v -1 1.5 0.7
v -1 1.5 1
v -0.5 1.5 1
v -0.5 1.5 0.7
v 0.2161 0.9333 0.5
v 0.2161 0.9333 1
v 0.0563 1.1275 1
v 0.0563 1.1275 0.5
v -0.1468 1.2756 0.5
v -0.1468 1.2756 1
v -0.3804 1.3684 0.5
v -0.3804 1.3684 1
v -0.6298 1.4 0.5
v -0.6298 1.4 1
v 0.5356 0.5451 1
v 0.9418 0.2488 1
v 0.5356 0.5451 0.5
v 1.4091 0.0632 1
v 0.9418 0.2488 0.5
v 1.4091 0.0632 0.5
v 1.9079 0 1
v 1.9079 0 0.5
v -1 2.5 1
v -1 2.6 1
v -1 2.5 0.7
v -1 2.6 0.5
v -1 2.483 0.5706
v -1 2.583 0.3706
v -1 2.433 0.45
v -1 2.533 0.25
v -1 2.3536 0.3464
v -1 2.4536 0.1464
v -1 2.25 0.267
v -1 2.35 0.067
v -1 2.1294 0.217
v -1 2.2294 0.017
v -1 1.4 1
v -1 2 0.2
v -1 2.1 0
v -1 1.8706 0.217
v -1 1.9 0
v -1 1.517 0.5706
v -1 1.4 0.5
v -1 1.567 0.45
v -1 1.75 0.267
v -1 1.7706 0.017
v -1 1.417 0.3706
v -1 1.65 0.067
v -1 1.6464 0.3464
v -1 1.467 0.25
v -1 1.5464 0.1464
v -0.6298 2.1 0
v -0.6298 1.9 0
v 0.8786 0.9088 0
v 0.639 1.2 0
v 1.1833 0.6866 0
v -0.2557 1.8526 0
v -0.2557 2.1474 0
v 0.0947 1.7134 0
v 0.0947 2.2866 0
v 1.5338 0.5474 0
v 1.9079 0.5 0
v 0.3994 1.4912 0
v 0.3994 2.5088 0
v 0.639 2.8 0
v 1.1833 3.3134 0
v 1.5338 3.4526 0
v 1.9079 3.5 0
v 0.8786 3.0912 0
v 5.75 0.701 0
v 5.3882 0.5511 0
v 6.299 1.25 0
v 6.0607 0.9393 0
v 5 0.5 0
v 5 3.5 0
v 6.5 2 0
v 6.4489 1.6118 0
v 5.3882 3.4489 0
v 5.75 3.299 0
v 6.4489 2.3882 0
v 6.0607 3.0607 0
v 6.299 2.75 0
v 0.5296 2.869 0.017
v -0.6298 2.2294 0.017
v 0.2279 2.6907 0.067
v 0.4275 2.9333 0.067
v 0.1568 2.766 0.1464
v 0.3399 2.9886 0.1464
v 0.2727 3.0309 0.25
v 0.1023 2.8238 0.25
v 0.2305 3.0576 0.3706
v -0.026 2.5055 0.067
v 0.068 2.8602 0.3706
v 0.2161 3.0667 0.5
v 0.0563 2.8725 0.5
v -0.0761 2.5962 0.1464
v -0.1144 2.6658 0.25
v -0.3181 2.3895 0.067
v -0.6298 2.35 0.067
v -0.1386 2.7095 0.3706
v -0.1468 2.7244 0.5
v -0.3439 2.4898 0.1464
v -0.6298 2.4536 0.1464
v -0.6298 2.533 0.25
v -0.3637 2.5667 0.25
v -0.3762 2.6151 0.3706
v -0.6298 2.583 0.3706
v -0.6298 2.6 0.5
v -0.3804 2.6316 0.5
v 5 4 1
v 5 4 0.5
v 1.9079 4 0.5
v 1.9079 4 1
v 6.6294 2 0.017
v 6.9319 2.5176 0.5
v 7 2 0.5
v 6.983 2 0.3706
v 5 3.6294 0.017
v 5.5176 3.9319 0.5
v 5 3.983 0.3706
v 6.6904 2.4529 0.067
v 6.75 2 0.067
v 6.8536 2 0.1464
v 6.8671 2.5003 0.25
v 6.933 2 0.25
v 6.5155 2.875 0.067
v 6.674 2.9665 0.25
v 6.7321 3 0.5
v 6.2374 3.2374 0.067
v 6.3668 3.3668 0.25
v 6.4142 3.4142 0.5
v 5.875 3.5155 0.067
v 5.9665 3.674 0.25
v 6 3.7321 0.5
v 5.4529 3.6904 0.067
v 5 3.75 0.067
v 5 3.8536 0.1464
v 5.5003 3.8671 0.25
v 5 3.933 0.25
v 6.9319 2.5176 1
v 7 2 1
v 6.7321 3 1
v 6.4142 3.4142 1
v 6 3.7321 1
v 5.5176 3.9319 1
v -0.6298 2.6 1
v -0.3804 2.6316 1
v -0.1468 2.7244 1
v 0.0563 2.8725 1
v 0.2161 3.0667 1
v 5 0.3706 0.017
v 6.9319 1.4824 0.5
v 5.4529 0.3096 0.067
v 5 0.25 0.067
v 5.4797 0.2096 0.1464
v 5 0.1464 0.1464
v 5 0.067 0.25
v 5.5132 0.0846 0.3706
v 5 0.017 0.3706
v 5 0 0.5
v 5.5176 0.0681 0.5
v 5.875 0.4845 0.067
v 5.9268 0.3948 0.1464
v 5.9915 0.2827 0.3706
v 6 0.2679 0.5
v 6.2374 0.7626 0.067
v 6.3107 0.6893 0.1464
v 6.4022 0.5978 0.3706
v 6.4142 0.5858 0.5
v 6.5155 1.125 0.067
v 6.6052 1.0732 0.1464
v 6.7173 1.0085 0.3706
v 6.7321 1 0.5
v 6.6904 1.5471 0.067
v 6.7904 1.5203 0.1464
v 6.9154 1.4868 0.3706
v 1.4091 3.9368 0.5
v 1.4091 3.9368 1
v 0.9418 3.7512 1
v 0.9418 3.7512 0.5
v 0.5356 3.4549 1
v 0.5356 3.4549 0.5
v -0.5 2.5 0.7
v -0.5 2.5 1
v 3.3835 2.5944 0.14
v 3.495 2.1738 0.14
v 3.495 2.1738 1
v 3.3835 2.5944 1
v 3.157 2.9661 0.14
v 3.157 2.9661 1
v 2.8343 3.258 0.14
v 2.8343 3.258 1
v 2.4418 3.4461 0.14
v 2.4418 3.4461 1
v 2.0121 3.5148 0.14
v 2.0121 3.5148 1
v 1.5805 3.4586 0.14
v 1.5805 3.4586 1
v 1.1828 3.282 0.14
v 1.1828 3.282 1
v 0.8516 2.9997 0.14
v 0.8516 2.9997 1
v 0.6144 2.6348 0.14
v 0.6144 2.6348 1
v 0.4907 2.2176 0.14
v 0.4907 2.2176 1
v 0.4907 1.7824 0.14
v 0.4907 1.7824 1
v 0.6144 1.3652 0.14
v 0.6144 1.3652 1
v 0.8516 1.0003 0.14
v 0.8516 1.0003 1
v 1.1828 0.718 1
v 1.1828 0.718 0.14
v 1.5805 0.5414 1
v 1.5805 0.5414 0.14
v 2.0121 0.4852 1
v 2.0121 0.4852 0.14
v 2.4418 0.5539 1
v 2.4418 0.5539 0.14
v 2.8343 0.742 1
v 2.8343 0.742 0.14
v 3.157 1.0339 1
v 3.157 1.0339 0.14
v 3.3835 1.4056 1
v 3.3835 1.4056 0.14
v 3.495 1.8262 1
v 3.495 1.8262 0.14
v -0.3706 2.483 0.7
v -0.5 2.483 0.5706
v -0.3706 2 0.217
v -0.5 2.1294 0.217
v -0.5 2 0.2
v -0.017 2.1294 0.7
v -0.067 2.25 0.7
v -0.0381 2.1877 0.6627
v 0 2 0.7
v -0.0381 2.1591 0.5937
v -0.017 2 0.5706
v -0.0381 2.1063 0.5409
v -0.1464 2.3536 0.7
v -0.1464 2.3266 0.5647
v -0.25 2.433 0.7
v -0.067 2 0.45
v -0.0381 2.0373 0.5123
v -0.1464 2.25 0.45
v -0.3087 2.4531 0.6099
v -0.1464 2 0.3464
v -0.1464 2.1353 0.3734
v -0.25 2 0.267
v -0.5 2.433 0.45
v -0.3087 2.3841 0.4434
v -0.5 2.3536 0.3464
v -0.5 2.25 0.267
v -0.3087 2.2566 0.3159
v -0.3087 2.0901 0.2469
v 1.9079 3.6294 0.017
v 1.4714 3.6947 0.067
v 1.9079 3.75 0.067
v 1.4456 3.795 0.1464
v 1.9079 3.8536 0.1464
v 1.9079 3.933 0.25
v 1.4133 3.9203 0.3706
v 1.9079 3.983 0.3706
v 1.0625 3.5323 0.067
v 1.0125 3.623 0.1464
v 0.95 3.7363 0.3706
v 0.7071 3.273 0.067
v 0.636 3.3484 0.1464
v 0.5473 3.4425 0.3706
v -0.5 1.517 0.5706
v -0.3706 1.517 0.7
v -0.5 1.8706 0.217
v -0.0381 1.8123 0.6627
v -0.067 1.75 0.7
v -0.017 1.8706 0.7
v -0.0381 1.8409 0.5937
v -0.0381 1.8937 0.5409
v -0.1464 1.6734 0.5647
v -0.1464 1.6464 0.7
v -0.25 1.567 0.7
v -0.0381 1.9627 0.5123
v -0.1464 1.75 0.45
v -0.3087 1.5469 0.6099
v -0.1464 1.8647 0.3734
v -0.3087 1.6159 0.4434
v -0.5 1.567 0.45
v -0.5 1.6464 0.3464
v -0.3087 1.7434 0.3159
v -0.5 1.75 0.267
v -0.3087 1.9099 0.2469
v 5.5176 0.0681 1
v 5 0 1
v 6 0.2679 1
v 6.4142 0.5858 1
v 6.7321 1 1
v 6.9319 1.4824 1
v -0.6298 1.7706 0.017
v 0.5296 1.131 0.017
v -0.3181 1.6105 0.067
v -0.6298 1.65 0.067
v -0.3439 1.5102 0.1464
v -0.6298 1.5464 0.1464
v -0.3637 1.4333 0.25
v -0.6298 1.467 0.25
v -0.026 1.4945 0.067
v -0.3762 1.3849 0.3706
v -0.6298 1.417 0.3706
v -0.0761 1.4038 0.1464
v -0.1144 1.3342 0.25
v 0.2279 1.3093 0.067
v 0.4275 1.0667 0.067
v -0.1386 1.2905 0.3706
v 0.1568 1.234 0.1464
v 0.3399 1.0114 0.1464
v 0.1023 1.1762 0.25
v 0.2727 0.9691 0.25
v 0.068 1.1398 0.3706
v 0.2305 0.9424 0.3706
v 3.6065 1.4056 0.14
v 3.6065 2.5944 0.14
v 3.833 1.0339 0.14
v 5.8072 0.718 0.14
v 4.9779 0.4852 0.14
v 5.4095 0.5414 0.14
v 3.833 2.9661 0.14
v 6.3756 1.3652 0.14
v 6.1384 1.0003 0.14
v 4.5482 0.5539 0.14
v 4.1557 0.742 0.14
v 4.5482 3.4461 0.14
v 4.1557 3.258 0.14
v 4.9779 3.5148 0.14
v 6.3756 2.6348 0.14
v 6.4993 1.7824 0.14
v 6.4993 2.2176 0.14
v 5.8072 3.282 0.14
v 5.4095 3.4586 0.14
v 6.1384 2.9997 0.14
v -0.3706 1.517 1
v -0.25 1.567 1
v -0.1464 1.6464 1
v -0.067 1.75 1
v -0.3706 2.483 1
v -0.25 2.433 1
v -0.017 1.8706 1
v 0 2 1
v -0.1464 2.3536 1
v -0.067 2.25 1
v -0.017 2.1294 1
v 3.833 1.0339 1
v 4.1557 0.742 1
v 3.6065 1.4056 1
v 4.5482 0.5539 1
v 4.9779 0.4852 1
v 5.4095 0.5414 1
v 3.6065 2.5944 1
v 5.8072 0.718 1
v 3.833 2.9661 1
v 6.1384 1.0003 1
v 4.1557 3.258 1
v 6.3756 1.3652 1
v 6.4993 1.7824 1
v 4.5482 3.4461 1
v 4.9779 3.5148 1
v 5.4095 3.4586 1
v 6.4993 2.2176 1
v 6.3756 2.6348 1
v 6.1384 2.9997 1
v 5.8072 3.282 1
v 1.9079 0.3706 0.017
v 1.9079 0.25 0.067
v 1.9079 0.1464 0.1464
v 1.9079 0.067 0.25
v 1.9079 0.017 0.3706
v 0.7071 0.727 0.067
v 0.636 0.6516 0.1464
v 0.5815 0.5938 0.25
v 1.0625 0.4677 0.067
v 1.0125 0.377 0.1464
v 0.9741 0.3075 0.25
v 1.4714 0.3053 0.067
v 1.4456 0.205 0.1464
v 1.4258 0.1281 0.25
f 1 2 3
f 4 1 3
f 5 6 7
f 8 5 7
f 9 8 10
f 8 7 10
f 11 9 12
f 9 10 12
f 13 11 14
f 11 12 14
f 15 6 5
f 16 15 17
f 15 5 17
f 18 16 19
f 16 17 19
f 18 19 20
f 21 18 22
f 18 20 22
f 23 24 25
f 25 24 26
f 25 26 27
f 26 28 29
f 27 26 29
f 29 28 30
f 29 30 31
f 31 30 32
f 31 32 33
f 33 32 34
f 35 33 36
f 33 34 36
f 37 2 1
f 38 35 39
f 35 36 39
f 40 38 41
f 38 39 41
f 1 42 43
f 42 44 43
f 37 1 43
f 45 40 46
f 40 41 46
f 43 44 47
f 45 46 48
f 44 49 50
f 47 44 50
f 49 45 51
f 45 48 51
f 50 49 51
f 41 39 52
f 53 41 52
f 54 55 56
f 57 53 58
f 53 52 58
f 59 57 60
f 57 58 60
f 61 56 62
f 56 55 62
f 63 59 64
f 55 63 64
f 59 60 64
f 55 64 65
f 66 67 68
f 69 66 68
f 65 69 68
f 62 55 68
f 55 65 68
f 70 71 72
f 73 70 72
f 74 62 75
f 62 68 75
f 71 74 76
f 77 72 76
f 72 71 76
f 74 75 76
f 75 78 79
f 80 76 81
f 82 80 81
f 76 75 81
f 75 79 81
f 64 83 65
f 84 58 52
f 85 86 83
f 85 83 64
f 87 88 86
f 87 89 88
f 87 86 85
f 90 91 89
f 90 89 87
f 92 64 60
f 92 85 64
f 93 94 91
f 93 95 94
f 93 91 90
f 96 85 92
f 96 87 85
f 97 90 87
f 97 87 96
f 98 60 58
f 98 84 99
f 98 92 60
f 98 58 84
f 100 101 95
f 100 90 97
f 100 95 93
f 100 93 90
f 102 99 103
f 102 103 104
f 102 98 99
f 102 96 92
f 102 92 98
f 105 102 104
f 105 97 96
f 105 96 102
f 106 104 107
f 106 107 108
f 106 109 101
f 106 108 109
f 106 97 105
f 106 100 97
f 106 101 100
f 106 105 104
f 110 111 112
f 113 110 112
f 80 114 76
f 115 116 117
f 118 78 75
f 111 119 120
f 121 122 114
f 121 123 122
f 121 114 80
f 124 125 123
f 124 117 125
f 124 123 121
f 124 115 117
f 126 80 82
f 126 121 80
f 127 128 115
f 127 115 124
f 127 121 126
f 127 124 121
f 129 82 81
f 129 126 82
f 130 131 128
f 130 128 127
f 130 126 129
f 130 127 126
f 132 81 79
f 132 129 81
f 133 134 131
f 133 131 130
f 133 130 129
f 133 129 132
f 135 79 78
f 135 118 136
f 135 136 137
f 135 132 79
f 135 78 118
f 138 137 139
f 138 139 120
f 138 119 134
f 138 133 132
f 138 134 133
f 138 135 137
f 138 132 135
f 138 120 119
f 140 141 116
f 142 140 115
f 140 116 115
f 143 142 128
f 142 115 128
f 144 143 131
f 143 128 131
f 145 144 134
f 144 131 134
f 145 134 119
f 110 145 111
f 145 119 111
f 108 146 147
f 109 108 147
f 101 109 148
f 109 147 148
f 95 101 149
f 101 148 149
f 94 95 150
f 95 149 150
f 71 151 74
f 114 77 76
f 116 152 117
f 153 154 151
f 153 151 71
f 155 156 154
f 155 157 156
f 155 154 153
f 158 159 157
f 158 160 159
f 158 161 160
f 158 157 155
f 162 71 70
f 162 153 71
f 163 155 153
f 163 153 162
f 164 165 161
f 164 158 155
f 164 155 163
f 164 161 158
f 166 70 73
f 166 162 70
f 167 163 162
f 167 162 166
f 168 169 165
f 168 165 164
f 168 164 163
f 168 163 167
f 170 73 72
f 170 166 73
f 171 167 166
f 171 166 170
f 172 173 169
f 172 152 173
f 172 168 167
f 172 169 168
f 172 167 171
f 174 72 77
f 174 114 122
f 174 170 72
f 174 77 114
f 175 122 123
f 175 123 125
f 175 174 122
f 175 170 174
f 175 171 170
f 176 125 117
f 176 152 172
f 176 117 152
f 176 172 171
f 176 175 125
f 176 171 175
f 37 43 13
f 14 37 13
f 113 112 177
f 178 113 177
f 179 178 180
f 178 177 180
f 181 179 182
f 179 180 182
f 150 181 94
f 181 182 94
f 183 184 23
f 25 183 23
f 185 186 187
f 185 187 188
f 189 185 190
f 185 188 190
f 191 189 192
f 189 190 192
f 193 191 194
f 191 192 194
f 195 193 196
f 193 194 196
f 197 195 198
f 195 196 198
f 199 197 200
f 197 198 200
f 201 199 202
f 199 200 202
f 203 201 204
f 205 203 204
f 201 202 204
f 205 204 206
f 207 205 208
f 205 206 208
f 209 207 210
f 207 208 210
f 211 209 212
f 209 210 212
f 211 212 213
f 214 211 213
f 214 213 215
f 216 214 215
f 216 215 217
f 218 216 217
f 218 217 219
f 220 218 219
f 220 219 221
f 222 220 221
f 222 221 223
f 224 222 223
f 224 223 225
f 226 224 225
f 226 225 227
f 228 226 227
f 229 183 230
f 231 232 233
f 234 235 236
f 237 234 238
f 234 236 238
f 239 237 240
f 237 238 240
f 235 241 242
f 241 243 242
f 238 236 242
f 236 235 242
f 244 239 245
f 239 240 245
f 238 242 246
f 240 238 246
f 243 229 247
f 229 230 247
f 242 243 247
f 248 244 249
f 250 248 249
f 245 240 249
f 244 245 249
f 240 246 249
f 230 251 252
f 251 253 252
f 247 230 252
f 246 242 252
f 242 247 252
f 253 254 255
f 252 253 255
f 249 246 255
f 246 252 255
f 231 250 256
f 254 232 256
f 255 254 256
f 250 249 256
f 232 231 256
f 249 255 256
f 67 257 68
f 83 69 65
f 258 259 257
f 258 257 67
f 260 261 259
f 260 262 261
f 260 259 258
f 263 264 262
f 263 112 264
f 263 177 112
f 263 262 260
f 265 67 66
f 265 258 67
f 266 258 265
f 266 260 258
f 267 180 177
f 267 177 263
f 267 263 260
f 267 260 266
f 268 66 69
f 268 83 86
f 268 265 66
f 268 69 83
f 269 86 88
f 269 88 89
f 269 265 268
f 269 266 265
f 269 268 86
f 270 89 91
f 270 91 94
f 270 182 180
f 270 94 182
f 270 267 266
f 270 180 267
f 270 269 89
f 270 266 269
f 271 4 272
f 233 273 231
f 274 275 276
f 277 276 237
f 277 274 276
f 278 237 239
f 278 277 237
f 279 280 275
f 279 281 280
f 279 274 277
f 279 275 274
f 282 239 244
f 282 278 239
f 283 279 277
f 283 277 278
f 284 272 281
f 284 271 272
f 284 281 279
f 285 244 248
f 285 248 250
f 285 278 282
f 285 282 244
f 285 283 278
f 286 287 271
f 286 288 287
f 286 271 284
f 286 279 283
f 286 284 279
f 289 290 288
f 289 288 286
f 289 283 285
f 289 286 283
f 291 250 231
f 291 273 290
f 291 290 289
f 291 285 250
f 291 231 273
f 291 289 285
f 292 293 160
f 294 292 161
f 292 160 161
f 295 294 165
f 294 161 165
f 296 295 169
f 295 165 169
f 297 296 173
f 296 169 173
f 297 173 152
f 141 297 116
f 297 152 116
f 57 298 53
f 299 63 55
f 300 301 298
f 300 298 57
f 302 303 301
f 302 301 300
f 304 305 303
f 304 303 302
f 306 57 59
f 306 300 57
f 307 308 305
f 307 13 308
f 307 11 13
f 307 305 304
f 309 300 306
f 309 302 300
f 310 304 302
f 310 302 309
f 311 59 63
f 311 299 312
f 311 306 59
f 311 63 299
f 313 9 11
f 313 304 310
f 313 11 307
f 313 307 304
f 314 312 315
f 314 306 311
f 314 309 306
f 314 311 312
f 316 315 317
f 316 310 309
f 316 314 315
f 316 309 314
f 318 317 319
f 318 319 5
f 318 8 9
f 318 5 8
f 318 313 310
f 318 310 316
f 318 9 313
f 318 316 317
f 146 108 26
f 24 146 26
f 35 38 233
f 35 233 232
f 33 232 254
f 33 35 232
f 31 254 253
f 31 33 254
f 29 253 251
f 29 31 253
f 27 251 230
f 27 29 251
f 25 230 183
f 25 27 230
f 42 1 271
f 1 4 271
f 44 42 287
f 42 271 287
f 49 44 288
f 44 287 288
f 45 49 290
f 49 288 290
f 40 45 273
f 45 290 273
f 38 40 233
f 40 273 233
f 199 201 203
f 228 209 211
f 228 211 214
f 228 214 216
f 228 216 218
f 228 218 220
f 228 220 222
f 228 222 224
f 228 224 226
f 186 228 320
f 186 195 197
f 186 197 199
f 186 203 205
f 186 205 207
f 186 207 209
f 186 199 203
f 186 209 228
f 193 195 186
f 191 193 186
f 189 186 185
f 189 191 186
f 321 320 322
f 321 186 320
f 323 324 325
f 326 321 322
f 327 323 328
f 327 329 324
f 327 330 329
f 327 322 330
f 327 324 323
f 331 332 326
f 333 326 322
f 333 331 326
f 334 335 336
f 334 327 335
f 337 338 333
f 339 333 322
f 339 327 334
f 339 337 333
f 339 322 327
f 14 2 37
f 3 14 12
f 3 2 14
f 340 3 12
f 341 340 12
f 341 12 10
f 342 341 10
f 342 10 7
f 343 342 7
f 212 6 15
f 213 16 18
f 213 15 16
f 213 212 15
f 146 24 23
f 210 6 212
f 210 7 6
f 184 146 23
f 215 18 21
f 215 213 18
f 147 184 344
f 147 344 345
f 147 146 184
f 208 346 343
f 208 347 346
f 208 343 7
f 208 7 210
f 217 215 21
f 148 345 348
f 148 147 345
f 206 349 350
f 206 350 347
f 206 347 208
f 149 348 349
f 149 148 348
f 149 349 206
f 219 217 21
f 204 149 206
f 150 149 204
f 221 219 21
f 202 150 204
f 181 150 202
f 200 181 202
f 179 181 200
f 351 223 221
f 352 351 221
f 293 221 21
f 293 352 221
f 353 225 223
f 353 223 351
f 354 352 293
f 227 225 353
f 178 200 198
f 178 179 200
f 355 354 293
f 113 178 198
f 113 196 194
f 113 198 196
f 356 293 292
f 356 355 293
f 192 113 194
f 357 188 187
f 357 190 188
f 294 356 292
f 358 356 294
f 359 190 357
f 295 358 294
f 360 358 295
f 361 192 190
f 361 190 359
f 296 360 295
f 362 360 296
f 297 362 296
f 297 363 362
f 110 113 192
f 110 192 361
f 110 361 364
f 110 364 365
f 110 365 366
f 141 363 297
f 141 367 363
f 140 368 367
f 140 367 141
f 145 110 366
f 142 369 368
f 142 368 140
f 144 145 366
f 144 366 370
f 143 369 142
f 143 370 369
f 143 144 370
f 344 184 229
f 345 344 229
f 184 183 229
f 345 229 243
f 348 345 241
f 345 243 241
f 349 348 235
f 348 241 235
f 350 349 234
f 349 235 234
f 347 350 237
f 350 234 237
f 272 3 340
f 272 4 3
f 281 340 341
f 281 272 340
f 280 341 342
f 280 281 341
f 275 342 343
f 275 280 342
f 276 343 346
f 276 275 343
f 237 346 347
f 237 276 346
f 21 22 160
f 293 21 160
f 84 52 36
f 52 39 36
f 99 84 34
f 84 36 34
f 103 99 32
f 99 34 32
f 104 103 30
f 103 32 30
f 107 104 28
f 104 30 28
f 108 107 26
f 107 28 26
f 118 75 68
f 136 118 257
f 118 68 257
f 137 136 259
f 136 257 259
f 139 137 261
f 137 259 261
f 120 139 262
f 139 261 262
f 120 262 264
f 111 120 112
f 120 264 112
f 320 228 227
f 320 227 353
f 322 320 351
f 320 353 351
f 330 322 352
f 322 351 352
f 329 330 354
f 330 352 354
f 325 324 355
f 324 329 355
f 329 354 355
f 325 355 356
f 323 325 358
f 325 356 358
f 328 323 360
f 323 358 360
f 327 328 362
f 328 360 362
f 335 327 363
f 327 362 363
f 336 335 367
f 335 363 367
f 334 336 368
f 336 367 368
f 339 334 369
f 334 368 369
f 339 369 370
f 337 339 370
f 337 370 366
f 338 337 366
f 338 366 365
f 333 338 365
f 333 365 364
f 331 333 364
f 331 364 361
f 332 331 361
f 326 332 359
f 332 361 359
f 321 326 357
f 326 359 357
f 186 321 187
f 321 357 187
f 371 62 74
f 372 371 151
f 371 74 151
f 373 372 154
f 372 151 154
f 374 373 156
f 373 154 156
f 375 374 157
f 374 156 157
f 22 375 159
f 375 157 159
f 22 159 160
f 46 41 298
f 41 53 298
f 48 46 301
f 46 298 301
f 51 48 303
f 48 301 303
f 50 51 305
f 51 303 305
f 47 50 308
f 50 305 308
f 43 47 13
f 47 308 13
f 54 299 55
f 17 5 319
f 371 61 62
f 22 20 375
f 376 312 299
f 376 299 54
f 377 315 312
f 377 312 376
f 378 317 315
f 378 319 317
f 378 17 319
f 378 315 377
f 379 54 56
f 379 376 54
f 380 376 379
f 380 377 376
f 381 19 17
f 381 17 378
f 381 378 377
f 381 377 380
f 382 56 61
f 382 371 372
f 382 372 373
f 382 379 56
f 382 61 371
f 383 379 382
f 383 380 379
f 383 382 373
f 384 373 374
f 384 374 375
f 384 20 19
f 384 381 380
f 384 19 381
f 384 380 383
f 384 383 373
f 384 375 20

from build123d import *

# Parameters (mm, degrees)
F1_DEPTH    = 1
F2_R        = 1.515
F3_DEPTH    = 0.86
F4_R        = 1.515
F5_DEPTH    = 0.86
F6_DEPTH    = 0.6
F8_DEPTH    = 0.8
F9_T1_DEPTH = 10.5393920142
F9_T3_DEPTH = 11
F10_R       = 1
F11_R       = 0.49999
F12_R       = 0.5


# Not quite as in the source:
# - a fillet or chamfer that OpenCascade refuses, or shapes differently, is made with other operations: its cross-section is extruded or revolved along the edge and cut away or added
# - a fillet or chamfer is up to 0.001 mm smaller than in the source, because OpenCascade refuses the exact size


with BuildPart() as f1:
    # F0 (on Top) → F1 (new body)
    with BuildSketch(Plane.XY):
        Polygon((0, 1.4), (0, 0), (7, 0), (7, 4), (0, 4), (0, 2.6), (0, 2), align=None)
        Polygon((-1, 1.4), (0, 1.4), (0, 2), (0, 2.6), (-1, 2.6), align=None)
    extrude(amount=F1_DEPTH)

    # F2 (on face) → F3 (cut)
    with BuildSketch(Plane.XY.offset(1)):
        with Locations((5, 2)):
            Circle(F2_R)
    extrude(amount=-F3_DEPTH, mode=Mode.SUBTRACT)

    # F4 (on face) → F5 (cut)
    with BuildSketch(Plane.XY.offset(1)):
        with Locations((1.99, 2)):
            Circle(F4_R)
    extrude(amount=-F5_DEPTH, mode=Mode.SUBTRACT)

    # F4 (on face) → F6 (cut)
    with BuildSketch(Plane.XY.offset(1)):
        with Locations((1.99, 2)):
            Circle(F4_R)
    extrude(amount=-F6_DEPTH, mode=Mode.SUBTRACT)

    # F7 (on face) → F8 (cut)
    with BuildSketch(Plane.XY.offset(1)):
        Polygon((-1, 2.5), (-1, 2), (-1, 1.5), (0, 1.5), (0, 2.5), align=None)
    extrude(amount=-F8_DEPTH, mode=Mode.SUBTRACT)

    # F9: fillet of radius 2 on 4 edges, made by hand

    # F9_s2 → F9_t1 (cut)
    with BuildSketch(Plane.XY.offset(-4.7696960071)):
        with BuildLine():
            ThreePointArc((1.9078784028, 4), (0.7246624462, 3.6124515497), (0, 2.6))
            Line((0, 2.6), (-0.0381575681, 2.612))
            ThreePointArc((-0.0381575681, 2.612), (-0.04, 3.3), (-0.04, 4))
            Line((-0.04, 4), (0, 4.04))
            Line((0, 4.04), (1.9078784028, 4.04))
            Line((1.9078784028, 4.04), (1.9078784028, 4))
        make_face()
        with BuildLine():
            ThreePointArc((0, 1.4), (0.7246624462, 0.3875484503), (1.9078784028, 0))
            Line((1.9078784028, 0), (1.9078784028, -0.04))
            Line((1.9078784028, -0.04), (0, -0.04))
            Line((0, -0.04), (-0.04, 0))
            ThreePointArc((-0.04, 0), (-0.04, 0.7), (-0.0381575681, 1.388))
            Line((-0.0381575681, 1.388), (0, 1.4))
        make_face()
    extrude(amount=F9_T1_DEPTH, mode=Mode.SUBTRACT)

    # F9_s4 → F9_t3 (cut)
    with BuildSketch(Plane.XY.offset(-5)):
        with BuildLine():
            ThreePointArc((7, 2), (6.4142135624, 3.4142135624), (5, 4))
            Line((5, 4), (5, 4.04))
            Line((5, 4.04), (7.04, 4.04))
            Line((7.04, 4.04), (7.04, 2))
            Line((7.04, 2), (7, 2))
        make_face()
        with BuildLine():
            ThreePointArc((5, 0), (6.4142135624, 0.5857864376), (7, 2))
            Line((7, 2), (7.04, 2))
            Line((7.04, 2), (7.04, -0.04))
            Line((7.04, -0.04), (5, -0.04))
            Line((5, -0.04), (5, 0))
        make_face()
    extrude(amount=F9_T3_DEPTH, mode=Mode.SUBTRACT)

    # F10
    f10_edges = [f1.edges().sort_by_distance(p)[0] for p in [
        (0, 1.4, 0.5),
        (0, 2.6, 0.5),
    ]]
    fillet(f10_edges, radius=F10_R)

    # F11 (radius 0.5 in the source; OpenCascade refuses exactly that, so slightly less here)
    f11_edges = [f1.edges().sort_by_distance(p)[0] for p in [
        (-0.5, 2.5, 0.2),
        (-0.5, 1.5, 0.2),
        (0, 1.5, 0.6),
        (0, 2.5, 0.6),
        (0, 2, 0.2),
    ]]
    fillet(f11_edges, radius=F11_R)

    # F12
    f12_edges = [f1.edges().sort_by_distance(p)[0] for p in [
        (3.453939, 0, 0),
        (6.414214, 0.585786, 0),
    ]]
    fillet(f12_edges, radius=F12_R)


solid = f1.part
